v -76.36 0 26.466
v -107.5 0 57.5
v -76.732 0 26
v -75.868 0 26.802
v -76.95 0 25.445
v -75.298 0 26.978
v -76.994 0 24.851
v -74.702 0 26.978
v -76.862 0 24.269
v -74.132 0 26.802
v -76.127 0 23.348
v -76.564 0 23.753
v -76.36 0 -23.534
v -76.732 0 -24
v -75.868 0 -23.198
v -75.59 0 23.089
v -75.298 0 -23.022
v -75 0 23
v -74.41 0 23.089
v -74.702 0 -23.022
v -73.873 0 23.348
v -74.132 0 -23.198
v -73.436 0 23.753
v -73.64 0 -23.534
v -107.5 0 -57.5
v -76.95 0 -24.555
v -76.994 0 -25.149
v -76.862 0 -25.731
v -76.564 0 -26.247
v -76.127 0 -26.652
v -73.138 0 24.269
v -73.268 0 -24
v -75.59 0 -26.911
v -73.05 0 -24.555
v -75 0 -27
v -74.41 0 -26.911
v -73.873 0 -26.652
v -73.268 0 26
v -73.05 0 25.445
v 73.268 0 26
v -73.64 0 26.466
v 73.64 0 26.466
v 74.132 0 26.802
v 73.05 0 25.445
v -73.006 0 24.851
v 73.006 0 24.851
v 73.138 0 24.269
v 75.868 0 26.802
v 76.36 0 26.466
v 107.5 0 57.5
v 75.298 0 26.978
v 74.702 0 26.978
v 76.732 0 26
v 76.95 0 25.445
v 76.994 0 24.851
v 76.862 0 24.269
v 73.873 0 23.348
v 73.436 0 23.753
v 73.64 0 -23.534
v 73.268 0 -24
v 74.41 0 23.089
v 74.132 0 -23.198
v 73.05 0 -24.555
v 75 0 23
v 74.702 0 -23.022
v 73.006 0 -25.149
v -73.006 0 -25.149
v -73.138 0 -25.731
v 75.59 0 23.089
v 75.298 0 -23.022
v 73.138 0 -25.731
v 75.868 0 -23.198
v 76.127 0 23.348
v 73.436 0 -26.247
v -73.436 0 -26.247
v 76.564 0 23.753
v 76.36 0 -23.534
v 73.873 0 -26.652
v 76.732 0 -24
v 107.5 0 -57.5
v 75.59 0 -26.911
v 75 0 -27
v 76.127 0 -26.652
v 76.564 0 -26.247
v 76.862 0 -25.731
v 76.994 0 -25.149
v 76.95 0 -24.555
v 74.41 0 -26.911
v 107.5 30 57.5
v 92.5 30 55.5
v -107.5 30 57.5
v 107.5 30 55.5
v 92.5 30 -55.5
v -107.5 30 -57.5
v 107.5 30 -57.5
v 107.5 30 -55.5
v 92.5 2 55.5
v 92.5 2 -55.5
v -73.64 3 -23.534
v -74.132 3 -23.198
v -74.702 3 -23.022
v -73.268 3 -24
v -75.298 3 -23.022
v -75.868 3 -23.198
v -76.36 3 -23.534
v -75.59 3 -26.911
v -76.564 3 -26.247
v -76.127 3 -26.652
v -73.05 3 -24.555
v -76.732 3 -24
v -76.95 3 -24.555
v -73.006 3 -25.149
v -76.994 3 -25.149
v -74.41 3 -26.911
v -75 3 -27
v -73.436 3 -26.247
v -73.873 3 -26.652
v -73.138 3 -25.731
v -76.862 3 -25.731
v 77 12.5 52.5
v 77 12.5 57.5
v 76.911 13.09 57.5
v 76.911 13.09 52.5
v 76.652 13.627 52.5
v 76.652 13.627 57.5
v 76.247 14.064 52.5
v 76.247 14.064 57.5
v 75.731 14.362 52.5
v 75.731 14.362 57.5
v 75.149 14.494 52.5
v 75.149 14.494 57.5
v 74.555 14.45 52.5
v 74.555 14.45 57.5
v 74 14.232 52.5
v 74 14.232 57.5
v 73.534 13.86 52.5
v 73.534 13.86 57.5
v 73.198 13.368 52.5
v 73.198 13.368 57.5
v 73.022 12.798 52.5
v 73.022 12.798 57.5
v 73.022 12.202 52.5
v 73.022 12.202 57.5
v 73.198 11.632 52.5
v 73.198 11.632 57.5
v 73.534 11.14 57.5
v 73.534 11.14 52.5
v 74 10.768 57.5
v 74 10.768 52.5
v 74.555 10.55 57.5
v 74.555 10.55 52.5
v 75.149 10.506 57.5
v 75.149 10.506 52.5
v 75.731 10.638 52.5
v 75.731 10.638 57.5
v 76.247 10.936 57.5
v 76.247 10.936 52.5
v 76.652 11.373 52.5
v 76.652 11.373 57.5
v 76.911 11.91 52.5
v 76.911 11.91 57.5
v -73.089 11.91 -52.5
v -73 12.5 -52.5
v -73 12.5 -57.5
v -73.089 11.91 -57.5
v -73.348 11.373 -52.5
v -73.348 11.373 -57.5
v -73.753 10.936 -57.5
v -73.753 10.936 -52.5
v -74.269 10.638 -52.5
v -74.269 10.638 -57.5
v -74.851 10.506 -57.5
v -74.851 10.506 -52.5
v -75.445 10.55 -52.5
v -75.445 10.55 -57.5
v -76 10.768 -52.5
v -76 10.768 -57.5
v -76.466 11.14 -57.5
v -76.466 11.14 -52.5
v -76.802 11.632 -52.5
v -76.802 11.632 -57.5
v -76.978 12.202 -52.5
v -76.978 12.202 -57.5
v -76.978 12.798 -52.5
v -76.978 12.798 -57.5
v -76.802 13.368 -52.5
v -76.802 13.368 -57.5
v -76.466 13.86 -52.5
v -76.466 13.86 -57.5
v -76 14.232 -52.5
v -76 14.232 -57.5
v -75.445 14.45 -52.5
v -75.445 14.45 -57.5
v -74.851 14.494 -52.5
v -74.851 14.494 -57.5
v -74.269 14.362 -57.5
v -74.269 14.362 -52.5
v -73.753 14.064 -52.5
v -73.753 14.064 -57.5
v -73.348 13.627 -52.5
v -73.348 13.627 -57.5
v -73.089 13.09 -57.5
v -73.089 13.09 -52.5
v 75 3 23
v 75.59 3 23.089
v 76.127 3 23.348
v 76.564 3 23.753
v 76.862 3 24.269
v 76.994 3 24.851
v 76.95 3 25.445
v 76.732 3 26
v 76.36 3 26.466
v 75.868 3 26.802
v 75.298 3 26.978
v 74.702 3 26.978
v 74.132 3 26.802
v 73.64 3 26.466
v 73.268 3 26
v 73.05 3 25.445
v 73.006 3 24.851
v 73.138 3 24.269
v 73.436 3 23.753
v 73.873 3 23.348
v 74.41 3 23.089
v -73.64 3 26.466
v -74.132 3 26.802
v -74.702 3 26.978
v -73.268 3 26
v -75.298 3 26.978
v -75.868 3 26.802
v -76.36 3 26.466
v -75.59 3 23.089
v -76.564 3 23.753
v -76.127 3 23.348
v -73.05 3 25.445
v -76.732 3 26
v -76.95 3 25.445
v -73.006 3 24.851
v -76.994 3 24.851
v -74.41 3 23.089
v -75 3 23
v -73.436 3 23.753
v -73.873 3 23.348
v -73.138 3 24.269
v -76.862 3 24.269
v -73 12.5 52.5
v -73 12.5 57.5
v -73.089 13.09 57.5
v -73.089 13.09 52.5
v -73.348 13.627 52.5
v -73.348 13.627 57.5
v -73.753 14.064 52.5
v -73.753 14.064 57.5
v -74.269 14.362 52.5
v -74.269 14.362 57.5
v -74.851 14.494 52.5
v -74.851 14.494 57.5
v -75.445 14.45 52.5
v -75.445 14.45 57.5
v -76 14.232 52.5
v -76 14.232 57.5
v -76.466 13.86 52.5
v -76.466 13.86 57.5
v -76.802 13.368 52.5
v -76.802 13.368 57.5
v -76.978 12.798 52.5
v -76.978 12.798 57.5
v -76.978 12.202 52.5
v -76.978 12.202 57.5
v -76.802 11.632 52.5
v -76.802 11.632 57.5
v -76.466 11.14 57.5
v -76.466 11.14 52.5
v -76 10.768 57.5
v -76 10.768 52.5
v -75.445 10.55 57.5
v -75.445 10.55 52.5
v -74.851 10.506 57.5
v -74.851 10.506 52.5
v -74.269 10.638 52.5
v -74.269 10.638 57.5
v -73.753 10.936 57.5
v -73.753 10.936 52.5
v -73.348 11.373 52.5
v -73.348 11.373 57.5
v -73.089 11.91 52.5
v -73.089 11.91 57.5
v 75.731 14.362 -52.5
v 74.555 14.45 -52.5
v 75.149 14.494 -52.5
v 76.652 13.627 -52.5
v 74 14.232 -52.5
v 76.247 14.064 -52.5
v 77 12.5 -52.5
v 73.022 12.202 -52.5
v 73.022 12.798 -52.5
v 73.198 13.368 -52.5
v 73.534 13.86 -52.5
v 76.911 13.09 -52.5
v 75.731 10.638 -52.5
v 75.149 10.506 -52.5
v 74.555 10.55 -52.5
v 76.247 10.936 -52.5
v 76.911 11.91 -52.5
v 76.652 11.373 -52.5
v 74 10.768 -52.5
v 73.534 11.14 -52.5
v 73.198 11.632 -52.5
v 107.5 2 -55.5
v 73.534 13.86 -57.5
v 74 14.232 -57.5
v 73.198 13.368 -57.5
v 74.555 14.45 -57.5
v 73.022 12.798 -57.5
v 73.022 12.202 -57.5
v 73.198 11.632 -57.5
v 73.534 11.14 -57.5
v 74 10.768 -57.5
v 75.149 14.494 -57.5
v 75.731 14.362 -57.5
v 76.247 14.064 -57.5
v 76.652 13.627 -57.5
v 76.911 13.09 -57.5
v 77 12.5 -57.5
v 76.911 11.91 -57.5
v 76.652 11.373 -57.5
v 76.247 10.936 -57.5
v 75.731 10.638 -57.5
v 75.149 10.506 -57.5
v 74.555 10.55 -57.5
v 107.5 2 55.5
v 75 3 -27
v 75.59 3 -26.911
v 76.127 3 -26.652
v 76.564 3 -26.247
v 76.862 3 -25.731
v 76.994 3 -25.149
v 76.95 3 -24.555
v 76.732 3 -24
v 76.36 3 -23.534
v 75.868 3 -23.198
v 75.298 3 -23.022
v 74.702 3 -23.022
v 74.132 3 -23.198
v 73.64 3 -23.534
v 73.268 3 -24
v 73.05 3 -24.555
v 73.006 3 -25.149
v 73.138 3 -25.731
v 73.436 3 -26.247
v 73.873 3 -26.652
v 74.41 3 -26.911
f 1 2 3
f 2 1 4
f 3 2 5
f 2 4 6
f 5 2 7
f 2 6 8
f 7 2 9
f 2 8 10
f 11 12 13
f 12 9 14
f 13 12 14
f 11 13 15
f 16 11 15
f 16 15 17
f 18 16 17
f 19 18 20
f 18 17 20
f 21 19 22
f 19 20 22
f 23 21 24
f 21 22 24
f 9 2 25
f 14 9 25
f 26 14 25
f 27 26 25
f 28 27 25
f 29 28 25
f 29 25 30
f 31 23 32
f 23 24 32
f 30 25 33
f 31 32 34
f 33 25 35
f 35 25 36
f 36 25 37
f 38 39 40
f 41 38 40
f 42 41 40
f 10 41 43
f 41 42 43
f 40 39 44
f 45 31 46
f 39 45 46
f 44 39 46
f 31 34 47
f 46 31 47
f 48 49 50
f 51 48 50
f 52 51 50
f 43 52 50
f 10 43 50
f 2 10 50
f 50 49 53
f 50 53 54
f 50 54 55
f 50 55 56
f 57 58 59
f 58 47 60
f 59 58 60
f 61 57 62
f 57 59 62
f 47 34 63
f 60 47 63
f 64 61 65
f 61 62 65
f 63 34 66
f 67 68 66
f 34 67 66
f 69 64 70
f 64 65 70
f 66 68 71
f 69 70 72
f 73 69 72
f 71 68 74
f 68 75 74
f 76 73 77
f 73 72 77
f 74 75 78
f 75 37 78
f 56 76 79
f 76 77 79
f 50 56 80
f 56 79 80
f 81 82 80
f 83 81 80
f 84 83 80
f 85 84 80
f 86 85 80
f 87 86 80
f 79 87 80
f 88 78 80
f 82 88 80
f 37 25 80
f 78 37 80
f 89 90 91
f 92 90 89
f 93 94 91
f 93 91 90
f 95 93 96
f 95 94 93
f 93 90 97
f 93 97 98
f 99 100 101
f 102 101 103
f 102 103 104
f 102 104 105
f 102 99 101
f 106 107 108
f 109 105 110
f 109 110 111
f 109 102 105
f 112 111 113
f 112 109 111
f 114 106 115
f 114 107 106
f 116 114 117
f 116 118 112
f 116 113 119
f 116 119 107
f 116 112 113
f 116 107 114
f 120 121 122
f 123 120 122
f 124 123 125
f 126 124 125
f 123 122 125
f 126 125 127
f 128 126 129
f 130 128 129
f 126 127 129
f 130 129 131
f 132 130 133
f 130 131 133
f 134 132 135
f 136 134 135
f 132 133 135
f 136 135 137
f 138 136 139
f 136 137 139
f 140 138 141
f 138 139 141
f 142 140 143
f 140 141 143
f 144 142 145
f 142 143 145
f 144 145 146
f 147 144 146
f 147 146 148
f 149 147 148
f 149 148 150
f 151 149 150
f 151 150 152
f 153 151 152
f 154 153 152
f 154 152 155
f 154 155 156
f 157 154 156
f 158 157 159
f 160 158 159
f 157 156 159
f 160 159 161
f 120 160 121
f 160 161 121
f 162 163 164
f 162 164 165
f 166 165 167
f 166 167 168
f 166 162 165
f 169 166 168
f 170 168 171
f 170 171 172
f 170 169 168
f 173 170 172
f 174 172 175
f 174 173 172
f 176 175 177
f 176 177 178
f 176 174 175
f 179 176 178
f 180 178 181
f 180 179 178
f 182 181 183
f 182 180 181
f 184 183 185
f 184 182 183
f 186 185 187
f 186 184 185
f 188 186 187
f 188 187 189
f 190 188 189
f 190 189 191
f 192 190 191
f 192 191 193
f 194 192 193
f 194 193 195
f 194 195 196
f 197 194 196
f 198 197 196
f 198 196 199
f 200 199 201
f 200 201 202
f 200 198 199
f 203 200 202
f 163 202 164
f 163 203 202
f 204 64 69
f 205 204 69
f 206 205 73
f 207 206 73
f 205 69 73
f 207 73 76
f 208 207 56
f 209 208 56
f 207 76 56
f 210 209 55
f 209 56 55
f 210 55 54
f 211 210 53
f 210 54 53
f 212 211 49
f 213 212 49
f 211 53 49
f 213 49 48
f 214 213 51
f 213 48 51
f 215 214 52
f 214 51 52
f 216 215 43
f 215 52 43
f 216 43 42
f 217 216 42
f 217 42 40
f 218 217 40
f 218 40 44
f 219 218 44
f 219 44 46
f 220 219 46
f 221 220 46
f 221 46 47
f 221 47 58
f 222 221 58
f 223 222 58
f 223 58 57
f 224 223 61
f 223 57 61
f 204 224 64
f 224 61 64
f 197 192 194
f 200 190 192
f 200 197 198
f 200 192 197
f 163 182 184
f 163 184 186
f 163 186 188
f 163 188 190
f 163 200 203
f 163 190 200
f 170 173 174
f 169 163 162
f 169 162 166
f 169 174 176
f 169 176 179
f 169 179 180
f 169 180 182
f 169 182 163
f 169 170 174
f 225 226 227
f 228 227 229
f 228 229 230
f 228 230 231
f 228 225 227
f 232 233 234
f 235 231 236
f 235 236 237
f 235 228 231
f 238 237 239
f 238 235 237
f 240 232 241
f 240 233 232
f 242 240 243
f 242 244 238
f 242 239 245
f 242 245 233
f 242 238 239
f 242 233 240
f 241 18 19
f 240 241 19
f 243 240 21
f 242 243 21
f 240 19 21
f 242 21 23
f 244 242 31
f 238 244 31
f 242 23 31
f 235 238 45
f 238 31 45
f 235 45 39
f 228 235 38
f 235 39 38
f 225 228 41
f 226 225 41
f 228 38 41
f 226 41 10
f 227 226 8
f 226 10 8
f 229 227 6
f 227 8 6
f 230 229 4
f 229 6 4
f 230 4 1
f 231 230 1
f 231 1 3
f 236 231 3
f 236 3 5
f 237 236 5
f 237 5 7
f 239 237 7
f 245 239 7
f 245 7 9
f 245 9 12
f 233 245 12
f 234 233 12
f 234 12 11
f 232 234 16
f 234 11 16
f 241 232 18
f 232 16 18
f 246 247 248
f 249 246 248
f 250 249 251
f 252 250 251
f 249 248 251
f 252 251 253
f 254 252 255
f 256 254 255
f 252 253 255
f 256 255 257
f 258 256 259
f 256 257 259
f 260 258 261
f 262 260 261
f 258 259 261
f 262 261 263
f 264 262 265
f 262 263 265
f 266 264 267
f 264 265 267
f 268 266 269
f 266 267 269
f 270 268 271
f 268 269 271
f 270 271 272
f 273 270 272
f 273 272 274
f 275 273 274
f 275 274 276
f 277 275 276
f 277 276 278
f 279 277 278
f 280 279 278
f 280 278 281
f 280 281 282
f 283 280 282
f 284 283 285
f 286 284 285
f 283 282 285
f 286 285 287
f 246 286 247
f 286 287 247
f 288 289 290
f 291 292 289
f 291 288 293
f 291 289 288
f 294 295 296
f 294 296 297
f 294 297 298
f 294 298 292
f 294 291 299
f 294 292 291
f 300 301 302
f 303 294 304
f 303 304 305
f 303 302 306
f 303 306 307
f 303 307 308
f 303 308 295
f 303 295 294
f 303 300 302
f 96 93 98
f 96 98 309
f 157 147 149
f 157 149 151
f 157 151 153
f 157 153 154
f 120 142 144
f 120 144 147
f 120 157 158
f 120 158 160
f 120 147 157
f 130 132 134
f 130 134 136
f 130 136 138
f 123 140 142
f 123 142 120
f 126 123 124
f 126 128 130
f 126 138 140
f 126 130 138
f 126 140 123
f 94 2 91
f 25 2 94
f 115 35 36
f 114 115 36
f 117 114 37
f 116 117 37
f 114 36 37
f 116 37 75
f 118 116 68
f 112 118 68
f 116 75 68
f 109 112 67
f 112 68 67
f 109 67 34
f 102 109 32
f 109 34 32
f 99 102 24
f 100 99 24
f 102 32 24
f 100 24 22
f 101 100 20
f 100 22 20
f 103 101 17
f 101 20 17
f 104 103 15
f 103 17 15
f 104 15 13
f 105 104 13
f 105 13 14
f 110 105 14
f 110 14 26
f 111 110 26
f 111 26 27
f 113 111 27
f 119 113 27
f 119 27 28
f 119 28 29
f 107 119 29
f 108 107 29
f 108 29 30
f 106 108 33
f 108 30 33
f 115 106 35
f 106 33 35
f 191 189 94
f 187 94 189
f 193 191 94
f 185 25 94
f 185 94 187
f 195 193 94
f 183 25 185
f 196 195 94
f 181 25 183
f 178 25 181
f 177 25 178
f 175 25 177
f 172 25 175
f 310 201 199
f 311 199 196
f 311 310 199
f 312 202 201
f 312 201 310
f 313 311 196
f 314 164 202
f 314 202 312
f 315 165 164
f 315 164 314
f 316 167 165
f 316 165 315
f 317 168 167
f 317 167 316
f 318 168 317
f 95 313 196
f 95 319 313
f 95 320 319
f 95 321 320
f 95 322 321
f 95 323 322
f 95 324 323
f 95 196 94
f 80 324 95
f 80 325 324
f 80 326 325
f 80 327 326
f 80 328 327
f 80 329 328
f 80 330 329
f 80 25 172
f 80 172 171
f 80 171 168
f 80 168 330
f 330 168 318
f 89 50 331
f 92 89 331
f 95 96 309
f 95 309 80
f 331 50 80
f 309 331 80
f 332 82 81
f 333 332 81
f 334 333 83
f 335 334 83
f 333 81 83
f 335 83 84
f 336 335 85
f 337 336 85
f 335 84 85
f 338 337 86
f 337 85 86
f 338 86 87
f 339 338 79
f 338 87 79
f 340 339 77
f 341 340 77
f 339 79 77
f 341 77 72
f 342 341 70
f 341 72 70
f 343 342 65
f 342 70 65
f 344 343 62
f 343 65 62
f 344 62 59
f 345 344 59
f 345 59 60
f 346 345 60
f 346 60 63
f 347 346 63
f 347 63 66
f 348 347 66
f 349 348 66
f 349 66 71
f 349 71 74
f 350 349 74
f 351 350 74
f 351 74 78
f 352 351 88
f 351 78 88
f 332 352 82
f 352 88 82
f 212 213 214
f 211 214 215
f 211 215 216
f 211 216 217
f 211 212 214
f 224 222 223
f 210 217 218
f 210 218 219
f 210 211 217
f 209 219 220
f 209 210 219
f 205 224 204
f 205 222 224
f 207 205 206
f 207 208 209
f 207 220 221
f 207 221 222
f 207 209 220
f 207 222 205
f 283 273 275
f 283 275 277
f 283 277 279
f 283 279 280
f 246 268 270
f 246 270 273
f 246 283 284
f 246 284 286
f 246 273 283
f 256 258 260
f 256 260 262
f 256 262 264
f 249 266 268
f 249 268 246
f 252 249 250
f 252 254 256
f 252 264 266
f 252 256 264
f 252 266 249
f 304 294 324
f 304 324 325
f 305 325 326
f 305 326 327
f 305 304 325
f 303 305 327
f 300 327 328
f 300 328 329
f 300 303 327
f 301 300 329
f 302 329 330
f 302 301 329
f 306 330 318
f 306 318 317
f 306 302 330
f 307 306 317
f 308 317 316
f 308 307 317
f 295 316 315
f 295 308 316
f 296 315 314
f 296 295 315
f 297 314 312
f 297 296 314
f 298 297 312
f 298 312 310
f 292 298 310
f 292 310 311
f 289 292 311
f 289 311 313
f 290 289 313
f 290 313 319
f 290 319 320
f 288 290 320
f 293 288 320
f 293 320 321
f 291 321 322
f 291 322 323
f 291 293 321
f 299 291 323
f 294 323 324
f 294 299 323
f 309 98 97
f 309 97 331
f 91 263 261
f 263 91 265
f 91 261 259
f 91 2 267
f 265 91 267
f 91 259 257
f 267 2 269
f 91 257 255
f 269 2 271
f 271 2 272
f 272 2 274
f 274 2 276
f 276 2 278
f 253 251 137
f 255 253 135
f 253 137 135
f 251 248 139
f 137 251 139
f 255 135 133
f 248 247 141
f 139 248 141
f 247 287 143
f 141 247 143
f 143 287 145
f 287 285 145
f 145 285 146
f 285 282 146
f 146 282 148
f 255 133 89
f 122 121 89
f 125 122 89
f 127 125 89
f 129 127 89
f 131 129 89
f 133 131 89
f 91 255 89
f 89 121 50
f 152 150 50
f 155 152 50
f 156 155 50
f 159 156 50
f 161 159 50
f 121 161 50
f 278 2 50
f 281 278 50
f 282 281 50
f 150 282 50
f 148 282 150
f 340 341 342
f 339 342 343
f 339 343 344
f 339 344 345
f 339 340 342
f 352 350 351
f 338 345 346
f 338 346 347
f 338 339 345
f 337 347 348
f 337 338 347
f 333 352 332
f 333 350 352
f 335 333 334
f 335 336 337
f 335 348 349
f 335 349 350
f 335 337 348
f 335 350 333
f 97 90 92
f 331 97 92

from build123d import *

# Parameters (mm, degrees)
SKETCH1_W           = 215
SKETCH1_H           = 115
BOSS_EXTRUDE1_DEPTH = 30
SKETCH2_W           = 15
SKETCH2_H           = 111
CUT_EXTRUDE1_DEPTH  = 28
SKETCH3_R           = 2
CUT_EXTRUDE2_DEPTH  = 5
SKETCH4_R           = 2
CUT_EXTRUDE3_DEPTH  = 3
CUT_EXTRUDE4_START  = -5
SKETCH5_R           = 2
CUT_EXTRUDE4_DEPTH  = 5


with BuildPart() as part:
    # Sketch1 → Boss-Extrude1 (new body)
    with BuildSketch(Plane(origin=(0, 0, 0), x_dir=(1, 0, 0), z_dir=(0, 1, 0))):
        Rectangle(SKETCH1_W, SKETCH1_H)
    extrude(amount=BOSS_EXTRUDE1_DEPTH)

    # Sketch2 → Cut-Extrude1 (cut)
    with BuildSketch(Plane(origin=(0, 30, 0), x_dir=(1, 0, 0), z_dir=(0, 1, 0))):
        with Locations((100, 0)):
            Rectangle(SKETCH2_W, SKETCH2_H)
    extrude(amount=-CUT_EXTRUDE1_DEPTH, mode=Mode.SUBTRACT)

    # Sketch3 → Cut-Extrude2 (cut)
    with BuildSketch(Plane.XY.offset(57.5)):
        with Locations((75, 12.5)):
            Circle(SKETCH3_R)
        with Locations((-75, 12.5)):
            Circle(SKETCH3_R)
    extrude(amount=-CUT_EXTRUDE2_DEPTH, mode=Mode.SUBTRACT)

    # Sketch4 → Cut-Extrude3 (cut)
    with BuildSketch(Plane.XZ):
        with Locations(Location((75, -25, 0), (0, 0, 270))):
            Circle(SKETCH4_R)
        with Locations(Location((-75, -25, 0), (0, 0, 270))):
            Circle(SKETCH4_R)
        with Locations(Location((-75, 25, 0), (0, 0, 270))):
            Circle(SKETCH4_R)
        with Locations(Location((75, 25, 0), (0, 0, 270))):
            Circle(SKETCH4_R)
    extrude(amount=-CUT_EXTRUDE3_DEPTH, mode=Mode.SUBTRACT)

    # Sketch5 → Cut-Extrude4 (cut)
    with BuildSketch(Plane(origin=(0, 0, -57.5), x_dir=(-1, 0, 0), z_dir=(0, 0, -1)).offset(CUT_EXTRUDE4_START)):
        with Locations(Location((-75, 12.5, 0), (0, 0, 180))):
            Circle(SKETCH5_R)
        with Locations(Location((75, 12.5, 0), (0, 0, 180))):
            Circle(SKETCH5_R)
    extrude(amount=CUT_EXTRUDE4_DEPTH, mode=Mode.SUBTRACT)


solid = part.part
